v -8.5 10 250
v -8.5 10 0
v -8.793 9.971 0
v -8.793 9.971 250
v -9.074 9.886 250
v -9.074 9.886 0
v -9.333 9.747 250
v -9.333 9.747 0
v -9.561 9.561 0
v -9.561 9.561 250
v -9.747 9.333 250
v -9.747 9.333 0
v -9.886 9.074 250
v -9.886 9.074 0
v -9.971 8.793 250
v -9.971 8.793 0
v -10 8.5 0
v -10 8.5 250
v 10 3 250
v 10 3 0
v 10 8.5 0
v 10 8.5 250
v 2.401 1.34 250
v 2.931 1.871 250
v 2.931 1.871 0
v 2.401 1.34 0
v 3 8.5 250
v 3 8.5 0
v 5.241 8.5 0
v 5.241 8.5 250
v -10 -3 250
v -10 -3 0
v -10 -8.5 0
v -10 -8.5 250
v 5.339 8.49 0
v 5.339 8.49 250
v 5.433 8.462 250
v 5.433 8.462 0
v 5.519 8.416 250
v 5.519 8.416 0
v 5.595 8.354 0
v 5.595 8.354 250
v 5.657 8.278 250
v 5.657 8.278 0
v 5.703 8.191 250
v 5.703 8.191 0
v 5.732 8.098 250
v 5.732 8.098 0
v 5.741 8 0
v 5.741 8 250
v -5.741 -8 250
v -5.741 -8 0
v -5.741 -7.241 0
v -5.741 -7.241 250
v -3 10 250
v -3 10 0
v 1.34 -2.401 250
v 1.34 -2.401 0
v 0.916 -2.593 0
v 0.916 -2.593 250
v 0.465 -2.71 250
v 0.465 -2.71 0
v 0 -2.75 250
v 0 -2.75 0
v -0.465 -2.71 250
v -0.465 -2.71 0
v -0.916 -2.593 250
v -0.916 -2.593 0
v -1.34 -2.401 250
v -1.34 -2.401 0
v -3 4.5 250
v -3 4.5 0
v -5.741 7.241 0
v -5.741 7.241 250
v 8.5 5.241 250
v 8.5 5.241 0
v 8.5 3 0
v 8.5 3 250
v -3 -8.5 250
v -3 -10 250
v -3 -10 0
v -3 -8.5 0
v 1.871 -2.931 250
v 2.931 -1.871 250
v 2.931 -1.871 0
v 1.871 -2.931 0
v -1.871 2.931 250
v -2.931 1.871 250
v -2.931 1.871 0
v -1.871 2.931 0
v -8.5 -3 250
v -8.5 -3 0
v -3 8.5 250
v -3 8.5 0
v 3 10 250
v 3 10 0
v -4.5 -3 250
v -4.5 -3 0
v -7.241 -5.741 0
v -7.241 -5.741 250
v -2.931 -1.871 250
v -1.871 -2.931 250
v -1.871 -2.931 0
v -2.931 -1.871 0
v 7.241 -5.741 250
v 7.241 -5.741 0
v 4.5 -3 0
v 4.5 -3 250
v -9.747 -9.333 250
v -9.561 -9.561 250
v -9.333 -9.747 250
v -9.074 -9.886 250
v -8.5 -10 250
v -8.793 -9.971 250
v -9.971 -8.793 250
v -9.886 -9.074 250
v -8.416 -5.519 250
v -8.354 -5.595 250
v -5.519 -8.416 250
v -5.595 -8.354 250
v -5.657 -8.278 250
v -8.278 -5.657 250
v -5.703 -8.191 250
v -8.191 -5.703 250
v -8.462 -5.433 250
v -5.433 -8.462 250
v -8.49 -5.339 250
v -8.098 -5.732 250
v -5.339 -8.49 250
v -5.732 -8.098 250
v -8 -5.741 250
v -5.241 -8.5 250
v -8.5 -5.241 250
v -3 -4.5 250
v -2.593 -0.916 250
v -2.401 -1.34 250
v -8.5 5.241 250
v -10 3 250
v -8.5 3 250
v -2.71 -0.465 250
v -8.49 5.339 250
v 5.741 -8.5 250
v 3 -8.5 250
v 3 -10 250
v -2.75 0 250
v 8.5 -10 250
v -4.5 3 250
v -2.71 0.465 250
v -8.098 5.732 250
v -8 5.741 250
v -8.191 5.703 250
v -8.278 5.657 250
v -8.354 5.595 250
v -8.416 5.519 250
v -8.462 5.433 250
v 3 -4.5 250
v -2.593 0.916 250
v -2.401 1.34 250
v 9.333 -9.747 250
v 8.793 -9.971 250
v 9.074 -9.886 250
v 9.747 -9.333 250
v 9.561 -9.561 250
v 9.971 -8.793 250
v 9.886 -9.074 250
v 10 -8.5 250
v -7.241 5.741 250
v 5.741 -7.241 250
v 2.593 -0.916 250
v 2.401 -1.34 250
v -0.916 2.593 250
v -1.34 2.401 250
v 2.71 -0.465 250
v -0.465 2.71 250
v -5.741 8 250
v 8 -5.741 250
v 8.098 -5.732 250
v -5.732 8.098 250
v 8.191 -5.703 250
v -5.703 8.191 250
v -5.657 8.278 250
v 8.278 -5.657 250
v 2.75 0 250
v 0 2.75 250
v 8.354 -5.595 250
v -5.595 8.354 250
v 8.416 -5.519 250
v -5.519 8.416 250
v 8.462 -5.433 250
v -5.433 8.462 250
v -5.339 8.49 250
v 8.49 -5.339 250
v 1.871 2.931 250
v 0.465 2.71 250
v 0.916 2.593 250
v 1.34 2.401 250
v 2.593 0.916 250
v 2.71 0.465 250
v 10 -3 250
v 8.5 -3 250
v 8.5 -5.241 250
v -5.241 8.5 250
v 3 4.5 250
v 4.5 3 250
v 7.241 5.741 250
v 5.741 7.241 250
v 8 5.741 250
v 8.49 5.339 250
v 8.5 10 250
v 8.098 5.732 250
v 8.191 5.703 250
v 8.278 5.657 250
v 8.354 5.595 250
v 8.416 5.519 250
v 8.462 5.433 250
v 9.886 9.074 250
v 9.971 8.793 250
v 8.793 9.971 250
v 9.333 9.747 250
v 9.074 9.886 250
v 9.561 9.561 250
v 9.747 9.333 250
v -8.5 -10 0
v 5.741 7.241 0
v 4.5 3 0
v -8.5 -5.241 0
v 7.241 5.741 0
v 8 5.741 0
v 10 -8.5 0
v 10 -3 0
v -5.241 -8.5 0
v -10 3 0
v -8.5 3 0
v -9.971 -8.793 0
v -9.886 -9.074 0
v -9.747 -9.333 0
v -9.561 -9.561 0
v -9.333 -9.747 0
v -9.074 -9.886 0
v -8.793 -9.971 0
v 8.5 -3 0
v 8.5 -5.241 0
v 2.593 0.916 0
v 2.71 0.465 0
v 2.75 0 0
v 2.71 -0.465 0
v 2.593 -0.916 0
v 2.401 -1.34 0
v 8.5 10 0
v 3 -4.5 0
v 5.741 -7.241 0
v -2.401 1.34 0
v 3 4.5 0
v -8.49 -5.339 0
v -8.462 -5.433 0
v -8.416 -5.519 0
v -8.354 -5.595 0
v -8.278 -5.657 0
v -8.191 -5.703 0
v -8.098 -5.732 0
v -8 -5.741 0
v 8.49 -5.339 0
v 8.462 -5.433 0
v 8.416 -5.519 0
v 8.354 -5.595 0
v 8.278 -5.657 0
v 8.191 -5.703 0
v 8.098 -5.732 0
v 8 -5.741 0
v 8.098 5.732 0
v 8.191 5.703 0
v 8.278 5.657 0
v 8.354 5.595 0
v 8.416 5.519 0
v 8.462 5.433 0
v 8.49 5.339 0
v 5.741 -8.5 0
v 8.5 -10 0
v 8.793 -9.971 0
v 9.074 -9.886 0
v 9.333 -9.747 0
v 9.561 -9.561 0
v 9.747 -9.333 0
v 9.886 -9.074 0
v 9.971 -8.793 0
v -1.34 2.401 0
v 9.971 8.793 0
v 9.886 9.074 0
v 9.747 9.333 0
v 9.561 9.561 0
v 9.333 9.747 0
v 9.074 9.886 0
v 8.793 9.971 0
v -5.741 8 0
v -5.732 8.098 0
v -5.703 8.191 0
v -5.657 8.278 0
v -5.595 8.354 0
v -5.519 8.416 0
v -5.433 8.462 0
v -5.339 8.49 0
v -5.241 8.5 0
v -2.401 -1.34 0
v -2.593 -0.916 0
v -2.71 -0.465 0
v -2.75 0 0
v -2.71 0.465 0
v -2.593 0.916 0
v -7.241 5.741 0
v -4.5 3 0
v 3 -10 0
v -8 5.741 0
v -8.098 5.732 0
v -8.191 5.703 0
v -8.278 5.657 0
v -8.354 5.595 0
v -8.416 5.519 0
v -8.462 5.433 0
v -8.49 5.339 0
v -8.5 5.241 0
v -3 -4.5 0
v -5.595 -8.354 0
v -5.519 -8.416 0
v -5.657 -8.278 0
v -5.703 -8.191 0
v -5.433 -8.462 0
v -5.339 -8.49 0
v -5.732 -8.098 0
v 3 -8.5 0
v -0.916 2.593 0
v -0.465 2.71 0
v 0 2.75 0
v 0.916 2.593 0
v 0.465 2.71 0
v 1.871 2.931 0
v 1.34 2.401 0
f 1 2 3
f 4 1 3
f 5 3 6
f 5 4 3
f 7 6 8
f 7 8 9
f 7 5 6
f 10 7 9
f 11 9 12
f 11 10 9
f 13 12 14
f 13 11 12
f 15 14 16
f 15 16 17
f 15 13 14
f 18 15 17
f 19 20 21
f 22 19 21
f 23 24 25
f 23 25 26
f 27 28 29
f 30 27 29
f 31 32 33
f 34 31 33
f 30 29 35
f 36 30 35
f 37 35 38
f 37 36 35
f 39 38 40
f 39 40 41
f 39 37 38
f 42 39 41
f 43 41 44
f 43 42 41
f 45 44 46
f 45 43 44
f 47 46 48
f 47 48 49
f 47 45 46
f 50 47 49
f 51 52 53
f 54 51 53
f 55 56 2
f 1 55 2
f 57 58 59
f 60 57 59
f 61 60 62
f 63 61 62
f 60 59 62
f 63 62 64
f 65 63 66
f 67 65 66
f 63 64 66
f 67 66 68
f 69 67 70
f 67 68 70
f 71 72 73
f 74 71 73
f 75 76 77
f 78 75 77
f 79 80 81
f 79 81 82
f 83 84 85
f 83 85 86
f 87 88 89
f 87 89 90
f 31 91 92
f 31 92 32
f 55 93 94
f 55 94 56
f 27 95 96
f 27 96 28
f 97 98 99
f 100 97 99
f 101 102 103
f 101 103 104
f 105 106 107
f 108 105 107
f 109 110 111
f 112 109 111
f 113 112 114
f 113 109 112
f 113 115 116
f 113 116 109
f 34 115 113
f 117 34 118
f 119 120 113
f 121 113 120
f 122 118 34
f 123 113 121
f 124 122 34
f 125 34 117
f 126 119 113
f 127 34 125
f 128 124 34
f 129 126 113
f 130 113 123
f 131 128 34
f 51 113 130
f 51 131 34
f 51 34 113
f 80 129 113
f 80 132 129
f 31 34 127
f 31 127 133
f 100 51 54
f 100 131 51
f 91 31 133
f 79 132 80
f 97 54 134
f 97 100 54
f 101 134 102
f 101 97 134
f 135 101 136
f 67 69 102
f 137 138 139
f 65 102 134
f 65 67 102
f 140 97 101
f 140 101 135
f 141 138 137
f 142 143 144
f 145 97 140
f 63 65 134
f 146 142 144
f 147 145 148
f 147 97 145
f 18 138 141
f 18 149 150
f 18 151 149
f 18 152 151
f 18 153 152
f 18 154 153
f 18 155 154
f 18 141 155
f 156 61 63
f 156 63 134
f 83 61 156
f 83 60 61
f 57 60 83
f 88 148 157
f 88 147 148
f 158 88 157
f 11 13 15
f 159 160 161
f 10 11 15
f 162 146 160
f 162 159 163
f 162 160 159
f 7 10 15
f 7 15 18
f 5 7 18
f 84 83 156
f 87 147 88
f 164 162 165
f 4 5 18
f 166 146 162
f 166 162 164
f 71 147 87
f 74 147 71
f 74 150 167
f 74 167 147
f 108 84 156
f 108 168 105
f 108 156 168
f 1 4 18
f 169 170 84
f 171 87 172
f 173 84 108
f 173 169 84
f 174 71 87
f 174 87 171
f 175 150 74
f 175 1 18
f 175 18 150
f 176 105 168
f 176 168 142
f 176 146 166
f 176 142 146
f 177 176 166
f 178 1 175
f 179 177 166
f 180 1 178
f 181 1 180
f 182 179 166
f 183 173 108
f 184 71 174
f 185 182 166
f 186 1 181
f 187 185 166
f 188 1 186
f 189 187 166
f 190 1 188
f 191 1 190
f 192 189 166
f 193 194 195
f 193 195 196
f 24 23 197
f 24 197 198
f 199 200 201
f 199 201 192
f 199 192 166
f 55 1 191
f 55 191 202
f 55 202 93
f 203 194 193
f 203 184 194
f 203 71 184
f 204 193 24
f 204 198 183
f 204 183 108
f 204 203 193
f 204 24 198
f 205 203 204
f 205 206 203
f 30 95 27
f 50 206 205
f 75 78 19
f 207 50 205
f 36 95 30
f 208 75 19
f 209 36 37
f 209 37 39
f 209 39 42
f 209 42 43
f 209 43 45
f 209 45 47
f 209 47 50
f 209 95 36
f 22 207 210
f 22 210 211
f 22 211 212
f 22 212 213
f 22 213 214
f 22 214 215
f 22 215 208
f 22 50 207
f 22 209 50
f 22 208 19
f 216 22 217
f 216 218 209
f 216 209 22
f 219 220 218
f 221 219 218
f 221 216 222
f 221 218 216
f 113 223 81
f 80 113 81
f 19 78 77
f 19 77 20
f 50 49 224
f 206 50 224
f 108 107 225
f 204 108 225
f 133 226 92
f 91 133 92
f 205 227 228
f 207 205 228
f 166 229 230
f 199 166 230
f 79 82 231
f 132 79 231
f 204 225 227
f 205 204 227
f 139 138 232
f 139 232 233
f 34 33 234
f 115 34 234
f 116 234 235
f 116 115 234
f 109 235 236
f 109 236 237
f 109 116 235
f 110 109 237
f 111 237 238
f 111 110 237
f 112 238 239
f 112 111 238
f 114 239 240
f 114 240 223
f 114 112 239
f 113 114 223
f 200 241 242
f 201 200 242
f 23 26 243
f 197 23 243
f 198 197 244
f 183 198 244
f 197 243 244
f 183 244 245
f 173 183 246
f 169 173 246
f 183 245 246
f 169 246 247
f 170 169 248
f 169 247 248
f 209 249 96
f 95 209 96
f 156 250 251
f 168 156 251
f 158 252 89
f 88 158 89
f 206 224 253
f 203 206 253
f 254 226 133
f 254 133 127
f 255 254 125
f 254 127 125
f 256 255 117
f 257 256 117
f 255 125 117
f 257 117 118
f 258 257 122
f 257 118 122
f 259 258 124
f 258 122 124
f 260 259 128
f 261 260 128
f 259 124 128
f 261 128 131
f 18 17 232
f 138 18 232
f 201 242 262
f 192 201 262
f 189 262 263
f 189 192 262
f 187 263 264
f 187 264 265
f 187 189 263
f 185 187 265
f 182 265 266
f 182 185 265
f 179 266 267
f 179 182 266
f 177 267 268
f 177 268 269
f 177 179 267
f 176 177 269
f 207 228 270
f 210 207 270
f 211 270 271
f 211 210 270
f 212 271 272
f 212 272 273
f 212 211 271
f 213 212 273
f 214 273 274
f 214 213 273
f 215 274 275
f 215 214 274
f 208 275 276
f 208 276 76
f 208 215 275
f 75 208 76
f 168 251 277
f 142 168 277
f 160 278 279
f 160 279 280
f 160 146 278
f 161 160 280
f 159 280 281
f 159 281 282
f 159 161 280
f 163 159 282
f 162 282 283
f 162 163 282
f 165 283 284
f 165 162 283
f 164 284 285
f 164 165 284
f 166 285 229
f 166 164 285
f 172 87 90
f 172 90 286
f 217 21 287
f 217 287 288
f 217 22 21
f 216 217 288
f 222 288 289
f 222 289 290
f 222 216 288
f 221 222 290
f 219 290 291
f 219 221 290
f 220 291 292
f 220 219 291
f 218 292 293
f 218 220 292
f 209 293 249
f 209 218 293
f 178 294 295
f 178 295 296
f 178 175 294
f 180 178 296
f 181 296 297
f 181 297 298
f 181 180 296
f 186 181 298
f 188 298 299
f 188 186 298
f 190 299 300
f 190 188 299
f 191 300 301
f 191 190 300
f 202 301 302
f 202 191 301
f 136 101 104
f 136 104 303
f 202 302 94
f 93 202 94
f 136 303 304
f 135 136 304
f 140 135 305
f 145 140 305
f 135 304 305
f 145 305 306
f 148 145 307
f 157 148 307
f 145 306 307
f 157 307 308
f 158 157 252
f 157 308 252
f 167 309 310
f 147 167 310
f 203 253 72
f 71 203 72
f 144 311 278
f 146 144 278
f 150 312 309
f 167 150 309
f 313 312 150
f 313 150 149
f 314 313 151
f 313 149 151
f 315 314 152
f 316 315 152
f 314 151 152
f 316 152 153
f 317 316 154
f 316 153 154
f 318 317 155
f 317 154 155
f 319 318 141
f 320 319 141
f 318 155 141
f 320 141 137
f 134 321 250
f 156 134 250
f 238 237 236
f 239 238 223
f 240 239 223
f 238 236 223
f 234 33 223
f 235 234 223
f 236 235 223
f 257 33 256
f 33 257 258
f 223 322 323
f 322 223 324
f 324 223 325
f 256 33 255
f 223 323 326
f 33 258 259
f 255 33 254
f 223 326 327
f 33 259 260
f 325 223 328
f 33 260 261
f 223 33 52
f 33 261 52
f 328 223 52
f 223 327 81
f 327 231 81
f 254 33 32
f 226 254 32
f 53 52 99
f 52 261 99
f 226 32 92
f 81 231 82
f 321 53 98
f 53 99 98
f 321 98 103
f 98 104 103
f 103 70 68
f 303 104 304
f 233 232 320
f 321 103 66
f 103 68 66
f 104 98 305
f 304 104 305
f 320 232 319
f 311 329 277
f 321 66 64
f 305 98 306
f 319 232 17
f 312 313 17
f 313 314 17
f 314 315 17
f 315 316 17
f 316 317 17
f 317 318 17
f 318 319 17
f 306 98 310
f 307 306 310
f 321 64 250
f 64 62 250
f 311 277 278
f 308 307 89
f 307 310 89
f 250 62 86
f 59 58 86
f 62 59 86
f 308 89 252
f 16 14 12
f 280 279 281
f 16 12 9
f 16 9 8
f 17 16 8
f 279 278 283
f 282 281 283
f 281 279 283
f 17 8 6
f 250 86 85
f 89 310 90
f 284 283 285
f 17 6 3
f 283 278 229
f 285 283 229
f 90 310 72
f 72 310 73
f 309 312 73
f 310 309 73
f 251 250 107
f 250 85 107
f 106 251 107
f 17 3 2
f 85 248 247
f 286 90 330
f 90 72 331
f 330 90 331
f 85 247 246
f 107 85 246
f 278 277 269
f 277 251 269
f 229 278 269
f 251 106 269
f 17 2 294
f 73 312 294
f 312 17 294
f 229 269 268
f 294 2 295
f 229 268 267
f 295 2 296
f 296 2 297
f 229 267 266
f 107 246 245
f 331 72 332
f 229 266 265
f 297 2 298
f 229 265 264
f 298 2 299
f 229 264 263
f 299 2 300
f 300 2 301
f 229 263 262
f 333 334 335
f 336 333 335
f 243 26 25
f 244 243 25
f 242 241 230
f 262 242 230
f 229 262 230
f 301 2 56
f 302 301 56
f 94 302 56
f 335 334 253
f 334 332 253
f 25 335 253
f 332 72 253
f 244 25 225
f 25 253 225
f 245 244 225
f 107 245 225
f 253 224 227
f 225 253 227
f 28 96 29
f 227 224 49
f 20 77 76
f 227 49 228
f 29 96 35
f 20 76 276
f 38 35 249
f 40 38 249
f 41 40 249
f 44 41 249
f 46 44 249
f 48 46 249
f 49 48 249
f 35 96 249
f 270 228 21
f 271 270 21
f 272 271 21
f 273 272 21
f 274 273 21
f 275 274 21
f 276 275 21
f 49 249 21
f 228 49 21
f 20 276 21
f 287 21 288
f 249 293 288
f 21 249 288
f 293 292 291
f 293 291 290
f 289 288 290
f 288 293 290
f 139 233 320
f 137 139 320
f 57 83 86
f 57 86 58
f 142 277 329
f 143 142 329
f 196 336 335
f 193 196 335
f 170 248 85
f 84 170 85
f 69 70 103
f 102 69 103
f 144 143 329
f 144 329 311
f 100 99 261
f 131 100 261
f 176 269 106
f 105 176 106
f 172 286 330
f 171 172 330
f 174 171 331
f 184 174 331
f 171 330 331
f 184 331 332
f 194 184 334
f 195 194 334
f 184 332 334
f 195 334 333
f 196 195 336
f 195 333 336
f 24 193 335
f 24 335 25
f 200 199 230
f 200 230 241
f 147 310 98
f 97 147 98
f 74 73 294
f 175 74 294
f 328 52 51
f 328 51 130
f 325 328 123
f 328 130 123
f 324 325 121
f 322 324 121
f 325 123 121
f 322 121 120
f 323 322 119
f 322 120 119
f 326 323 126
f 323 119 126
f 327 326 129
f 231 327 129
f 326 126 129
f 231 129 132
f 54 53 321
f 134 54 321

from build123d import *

# Parameters (mm, degrees)
SALIENTE_EXTRUIR1_DEPTH = 250
REDONDEO1_R             = 1.5
REDONDEO2_R             = 0.5
CORTAR_EXTRUIR1_DEPTH   = 251.399680511


with BuildPart() as part:
    # Croquis1 → Saliente-Extruir1 (new body)
    with BuildSketch(Plane.XY):
        Polygon((3, -4.5), (5.7413765, -7.2413765), (5.7413765, -8.5), (3, -8.5), (3, -10), (10, -10), (10, -3), (8.5, -3), (8.5, -5.7413765), (7.2413765, -5.7413765), (4.5, -3), (4.5, 3), (7.2413765, 5.7413765), (8.5, 5.7413765), (8.5, 3), (10, 3), (10, 10), (3, 10), (3, 8.5), (5.7413765, 8.5), (5.7413765, 7.2413765), (3, 4.5), (-3, 4.5), (-5.7413765, 7.2413765), (-5.7413765, 8.5), (-3, 8.5), (-3, 10), (-10, 10), (-10, 3), (-8.5, 3), (-8.5, 5.7413765), (-7.2413765, 5.7413765), (-4.5, 3), (-4.5, -3), (-7.2413765, -5.7413765), (-8.5, -5.7413765), (-8.5, -3), (-10, -3), (-10, -10), (-3, -10), (-3, -8.5), (-5.7413765, -8.5), (-5.7413765, -7.2413765), (-3, -4.5), align=None)
    extrude(amount=SALIENTE_EXTRUIR1_DEPTH)

    # Redondeo1
    redondeo1_edges = [part.edges().sort_by_distance(p)[0] for p in [
        (10, -10, 125),
        (-10, -10, 125),
        (-10, 10, 125),
        (10, 10, 125),
    ]]
    fillet(redondeo1_edges, radius=REDONDEO1_R)

    # Redondeo2
    redondeo2_edges = [part.edges().sort_by_distance(p)[0] for p in [
        (-5.7413765, -8.5, 125),
        (-8.5, -5.7413765, 125),
        (-8.5, 5.7413765, 125),
        (-5.7413765, 8.5, 125),
        (5.7413765, 8.5, 125),
        (8.5, 5.7413765, 125),
        (8.5, -5.7413765, 125),
    ]]
    fillet(redondeo2_edges, radius=REDONDEO2_R)

    # Croquis2 → Cortar-Extruir1 (cut, through all)
    with BuildSketch(Plane(origin=(0, 0, 0), x_dir=(-1, 0, 0), z_dir=(0, 0, -1))):
        with BuildLine():
            Line((-1.340498607, 2.401158779), (-1.870828693, 2.931488865))
            Line((-1.870828693, 2.931488865), (-2.931488865, 1.870828693))
            Line((-2.931488865, 1.870828693), (-2.401158779, 1.340498607))
            ThreePointArc((-2.401158779, 1.340498607), (-2.75, 0), (-2.401158779, -1.340498607))
            Line((-2.401158779, -1.340498607), (-2.931488865, -1.870828693))
            Line((-2.931488865, -1.870828693), (-1.870828693, -2.931488865))
            Line((-1.870828693, -2.931488865), (-1.340498607, -2.401158779))
            ThreePointArc((-1.340498607, -2.401158779), (0, -2.75), (1.340498607, -2.401158779))
            Line((1.340498607, -2.401158779), (1.870828693, -2.931488865))
            Line((1.870828693, -2.931488865), (2.931488865, -1.870828693))
            Line((2.931488865, -1.870828693), (2.401158779, -1.340498607))
            ThreePointArc((2.401158779, -1.340498607), (2.75, 0), (2.401158779, 1.340498607))
            Line((2.401158779, 1.340498607), (2.931488865, 1.870828693))
            Line((2.931488865, 1.870828693), (1.870828693, 2.931488865))
            Line((1.870828693, 2.931488865), (1.340498607, 2.401158779))
            ThreePointArc((1.340498607, 2.401158779), (0, 2.75), (-1.340498607, 2.401158779))
        make_face()
    extrude(amount=-CORTAR_EXTRUIR1_DEPTH, mode=Mode.SUBTRACT)


solid = part.part
